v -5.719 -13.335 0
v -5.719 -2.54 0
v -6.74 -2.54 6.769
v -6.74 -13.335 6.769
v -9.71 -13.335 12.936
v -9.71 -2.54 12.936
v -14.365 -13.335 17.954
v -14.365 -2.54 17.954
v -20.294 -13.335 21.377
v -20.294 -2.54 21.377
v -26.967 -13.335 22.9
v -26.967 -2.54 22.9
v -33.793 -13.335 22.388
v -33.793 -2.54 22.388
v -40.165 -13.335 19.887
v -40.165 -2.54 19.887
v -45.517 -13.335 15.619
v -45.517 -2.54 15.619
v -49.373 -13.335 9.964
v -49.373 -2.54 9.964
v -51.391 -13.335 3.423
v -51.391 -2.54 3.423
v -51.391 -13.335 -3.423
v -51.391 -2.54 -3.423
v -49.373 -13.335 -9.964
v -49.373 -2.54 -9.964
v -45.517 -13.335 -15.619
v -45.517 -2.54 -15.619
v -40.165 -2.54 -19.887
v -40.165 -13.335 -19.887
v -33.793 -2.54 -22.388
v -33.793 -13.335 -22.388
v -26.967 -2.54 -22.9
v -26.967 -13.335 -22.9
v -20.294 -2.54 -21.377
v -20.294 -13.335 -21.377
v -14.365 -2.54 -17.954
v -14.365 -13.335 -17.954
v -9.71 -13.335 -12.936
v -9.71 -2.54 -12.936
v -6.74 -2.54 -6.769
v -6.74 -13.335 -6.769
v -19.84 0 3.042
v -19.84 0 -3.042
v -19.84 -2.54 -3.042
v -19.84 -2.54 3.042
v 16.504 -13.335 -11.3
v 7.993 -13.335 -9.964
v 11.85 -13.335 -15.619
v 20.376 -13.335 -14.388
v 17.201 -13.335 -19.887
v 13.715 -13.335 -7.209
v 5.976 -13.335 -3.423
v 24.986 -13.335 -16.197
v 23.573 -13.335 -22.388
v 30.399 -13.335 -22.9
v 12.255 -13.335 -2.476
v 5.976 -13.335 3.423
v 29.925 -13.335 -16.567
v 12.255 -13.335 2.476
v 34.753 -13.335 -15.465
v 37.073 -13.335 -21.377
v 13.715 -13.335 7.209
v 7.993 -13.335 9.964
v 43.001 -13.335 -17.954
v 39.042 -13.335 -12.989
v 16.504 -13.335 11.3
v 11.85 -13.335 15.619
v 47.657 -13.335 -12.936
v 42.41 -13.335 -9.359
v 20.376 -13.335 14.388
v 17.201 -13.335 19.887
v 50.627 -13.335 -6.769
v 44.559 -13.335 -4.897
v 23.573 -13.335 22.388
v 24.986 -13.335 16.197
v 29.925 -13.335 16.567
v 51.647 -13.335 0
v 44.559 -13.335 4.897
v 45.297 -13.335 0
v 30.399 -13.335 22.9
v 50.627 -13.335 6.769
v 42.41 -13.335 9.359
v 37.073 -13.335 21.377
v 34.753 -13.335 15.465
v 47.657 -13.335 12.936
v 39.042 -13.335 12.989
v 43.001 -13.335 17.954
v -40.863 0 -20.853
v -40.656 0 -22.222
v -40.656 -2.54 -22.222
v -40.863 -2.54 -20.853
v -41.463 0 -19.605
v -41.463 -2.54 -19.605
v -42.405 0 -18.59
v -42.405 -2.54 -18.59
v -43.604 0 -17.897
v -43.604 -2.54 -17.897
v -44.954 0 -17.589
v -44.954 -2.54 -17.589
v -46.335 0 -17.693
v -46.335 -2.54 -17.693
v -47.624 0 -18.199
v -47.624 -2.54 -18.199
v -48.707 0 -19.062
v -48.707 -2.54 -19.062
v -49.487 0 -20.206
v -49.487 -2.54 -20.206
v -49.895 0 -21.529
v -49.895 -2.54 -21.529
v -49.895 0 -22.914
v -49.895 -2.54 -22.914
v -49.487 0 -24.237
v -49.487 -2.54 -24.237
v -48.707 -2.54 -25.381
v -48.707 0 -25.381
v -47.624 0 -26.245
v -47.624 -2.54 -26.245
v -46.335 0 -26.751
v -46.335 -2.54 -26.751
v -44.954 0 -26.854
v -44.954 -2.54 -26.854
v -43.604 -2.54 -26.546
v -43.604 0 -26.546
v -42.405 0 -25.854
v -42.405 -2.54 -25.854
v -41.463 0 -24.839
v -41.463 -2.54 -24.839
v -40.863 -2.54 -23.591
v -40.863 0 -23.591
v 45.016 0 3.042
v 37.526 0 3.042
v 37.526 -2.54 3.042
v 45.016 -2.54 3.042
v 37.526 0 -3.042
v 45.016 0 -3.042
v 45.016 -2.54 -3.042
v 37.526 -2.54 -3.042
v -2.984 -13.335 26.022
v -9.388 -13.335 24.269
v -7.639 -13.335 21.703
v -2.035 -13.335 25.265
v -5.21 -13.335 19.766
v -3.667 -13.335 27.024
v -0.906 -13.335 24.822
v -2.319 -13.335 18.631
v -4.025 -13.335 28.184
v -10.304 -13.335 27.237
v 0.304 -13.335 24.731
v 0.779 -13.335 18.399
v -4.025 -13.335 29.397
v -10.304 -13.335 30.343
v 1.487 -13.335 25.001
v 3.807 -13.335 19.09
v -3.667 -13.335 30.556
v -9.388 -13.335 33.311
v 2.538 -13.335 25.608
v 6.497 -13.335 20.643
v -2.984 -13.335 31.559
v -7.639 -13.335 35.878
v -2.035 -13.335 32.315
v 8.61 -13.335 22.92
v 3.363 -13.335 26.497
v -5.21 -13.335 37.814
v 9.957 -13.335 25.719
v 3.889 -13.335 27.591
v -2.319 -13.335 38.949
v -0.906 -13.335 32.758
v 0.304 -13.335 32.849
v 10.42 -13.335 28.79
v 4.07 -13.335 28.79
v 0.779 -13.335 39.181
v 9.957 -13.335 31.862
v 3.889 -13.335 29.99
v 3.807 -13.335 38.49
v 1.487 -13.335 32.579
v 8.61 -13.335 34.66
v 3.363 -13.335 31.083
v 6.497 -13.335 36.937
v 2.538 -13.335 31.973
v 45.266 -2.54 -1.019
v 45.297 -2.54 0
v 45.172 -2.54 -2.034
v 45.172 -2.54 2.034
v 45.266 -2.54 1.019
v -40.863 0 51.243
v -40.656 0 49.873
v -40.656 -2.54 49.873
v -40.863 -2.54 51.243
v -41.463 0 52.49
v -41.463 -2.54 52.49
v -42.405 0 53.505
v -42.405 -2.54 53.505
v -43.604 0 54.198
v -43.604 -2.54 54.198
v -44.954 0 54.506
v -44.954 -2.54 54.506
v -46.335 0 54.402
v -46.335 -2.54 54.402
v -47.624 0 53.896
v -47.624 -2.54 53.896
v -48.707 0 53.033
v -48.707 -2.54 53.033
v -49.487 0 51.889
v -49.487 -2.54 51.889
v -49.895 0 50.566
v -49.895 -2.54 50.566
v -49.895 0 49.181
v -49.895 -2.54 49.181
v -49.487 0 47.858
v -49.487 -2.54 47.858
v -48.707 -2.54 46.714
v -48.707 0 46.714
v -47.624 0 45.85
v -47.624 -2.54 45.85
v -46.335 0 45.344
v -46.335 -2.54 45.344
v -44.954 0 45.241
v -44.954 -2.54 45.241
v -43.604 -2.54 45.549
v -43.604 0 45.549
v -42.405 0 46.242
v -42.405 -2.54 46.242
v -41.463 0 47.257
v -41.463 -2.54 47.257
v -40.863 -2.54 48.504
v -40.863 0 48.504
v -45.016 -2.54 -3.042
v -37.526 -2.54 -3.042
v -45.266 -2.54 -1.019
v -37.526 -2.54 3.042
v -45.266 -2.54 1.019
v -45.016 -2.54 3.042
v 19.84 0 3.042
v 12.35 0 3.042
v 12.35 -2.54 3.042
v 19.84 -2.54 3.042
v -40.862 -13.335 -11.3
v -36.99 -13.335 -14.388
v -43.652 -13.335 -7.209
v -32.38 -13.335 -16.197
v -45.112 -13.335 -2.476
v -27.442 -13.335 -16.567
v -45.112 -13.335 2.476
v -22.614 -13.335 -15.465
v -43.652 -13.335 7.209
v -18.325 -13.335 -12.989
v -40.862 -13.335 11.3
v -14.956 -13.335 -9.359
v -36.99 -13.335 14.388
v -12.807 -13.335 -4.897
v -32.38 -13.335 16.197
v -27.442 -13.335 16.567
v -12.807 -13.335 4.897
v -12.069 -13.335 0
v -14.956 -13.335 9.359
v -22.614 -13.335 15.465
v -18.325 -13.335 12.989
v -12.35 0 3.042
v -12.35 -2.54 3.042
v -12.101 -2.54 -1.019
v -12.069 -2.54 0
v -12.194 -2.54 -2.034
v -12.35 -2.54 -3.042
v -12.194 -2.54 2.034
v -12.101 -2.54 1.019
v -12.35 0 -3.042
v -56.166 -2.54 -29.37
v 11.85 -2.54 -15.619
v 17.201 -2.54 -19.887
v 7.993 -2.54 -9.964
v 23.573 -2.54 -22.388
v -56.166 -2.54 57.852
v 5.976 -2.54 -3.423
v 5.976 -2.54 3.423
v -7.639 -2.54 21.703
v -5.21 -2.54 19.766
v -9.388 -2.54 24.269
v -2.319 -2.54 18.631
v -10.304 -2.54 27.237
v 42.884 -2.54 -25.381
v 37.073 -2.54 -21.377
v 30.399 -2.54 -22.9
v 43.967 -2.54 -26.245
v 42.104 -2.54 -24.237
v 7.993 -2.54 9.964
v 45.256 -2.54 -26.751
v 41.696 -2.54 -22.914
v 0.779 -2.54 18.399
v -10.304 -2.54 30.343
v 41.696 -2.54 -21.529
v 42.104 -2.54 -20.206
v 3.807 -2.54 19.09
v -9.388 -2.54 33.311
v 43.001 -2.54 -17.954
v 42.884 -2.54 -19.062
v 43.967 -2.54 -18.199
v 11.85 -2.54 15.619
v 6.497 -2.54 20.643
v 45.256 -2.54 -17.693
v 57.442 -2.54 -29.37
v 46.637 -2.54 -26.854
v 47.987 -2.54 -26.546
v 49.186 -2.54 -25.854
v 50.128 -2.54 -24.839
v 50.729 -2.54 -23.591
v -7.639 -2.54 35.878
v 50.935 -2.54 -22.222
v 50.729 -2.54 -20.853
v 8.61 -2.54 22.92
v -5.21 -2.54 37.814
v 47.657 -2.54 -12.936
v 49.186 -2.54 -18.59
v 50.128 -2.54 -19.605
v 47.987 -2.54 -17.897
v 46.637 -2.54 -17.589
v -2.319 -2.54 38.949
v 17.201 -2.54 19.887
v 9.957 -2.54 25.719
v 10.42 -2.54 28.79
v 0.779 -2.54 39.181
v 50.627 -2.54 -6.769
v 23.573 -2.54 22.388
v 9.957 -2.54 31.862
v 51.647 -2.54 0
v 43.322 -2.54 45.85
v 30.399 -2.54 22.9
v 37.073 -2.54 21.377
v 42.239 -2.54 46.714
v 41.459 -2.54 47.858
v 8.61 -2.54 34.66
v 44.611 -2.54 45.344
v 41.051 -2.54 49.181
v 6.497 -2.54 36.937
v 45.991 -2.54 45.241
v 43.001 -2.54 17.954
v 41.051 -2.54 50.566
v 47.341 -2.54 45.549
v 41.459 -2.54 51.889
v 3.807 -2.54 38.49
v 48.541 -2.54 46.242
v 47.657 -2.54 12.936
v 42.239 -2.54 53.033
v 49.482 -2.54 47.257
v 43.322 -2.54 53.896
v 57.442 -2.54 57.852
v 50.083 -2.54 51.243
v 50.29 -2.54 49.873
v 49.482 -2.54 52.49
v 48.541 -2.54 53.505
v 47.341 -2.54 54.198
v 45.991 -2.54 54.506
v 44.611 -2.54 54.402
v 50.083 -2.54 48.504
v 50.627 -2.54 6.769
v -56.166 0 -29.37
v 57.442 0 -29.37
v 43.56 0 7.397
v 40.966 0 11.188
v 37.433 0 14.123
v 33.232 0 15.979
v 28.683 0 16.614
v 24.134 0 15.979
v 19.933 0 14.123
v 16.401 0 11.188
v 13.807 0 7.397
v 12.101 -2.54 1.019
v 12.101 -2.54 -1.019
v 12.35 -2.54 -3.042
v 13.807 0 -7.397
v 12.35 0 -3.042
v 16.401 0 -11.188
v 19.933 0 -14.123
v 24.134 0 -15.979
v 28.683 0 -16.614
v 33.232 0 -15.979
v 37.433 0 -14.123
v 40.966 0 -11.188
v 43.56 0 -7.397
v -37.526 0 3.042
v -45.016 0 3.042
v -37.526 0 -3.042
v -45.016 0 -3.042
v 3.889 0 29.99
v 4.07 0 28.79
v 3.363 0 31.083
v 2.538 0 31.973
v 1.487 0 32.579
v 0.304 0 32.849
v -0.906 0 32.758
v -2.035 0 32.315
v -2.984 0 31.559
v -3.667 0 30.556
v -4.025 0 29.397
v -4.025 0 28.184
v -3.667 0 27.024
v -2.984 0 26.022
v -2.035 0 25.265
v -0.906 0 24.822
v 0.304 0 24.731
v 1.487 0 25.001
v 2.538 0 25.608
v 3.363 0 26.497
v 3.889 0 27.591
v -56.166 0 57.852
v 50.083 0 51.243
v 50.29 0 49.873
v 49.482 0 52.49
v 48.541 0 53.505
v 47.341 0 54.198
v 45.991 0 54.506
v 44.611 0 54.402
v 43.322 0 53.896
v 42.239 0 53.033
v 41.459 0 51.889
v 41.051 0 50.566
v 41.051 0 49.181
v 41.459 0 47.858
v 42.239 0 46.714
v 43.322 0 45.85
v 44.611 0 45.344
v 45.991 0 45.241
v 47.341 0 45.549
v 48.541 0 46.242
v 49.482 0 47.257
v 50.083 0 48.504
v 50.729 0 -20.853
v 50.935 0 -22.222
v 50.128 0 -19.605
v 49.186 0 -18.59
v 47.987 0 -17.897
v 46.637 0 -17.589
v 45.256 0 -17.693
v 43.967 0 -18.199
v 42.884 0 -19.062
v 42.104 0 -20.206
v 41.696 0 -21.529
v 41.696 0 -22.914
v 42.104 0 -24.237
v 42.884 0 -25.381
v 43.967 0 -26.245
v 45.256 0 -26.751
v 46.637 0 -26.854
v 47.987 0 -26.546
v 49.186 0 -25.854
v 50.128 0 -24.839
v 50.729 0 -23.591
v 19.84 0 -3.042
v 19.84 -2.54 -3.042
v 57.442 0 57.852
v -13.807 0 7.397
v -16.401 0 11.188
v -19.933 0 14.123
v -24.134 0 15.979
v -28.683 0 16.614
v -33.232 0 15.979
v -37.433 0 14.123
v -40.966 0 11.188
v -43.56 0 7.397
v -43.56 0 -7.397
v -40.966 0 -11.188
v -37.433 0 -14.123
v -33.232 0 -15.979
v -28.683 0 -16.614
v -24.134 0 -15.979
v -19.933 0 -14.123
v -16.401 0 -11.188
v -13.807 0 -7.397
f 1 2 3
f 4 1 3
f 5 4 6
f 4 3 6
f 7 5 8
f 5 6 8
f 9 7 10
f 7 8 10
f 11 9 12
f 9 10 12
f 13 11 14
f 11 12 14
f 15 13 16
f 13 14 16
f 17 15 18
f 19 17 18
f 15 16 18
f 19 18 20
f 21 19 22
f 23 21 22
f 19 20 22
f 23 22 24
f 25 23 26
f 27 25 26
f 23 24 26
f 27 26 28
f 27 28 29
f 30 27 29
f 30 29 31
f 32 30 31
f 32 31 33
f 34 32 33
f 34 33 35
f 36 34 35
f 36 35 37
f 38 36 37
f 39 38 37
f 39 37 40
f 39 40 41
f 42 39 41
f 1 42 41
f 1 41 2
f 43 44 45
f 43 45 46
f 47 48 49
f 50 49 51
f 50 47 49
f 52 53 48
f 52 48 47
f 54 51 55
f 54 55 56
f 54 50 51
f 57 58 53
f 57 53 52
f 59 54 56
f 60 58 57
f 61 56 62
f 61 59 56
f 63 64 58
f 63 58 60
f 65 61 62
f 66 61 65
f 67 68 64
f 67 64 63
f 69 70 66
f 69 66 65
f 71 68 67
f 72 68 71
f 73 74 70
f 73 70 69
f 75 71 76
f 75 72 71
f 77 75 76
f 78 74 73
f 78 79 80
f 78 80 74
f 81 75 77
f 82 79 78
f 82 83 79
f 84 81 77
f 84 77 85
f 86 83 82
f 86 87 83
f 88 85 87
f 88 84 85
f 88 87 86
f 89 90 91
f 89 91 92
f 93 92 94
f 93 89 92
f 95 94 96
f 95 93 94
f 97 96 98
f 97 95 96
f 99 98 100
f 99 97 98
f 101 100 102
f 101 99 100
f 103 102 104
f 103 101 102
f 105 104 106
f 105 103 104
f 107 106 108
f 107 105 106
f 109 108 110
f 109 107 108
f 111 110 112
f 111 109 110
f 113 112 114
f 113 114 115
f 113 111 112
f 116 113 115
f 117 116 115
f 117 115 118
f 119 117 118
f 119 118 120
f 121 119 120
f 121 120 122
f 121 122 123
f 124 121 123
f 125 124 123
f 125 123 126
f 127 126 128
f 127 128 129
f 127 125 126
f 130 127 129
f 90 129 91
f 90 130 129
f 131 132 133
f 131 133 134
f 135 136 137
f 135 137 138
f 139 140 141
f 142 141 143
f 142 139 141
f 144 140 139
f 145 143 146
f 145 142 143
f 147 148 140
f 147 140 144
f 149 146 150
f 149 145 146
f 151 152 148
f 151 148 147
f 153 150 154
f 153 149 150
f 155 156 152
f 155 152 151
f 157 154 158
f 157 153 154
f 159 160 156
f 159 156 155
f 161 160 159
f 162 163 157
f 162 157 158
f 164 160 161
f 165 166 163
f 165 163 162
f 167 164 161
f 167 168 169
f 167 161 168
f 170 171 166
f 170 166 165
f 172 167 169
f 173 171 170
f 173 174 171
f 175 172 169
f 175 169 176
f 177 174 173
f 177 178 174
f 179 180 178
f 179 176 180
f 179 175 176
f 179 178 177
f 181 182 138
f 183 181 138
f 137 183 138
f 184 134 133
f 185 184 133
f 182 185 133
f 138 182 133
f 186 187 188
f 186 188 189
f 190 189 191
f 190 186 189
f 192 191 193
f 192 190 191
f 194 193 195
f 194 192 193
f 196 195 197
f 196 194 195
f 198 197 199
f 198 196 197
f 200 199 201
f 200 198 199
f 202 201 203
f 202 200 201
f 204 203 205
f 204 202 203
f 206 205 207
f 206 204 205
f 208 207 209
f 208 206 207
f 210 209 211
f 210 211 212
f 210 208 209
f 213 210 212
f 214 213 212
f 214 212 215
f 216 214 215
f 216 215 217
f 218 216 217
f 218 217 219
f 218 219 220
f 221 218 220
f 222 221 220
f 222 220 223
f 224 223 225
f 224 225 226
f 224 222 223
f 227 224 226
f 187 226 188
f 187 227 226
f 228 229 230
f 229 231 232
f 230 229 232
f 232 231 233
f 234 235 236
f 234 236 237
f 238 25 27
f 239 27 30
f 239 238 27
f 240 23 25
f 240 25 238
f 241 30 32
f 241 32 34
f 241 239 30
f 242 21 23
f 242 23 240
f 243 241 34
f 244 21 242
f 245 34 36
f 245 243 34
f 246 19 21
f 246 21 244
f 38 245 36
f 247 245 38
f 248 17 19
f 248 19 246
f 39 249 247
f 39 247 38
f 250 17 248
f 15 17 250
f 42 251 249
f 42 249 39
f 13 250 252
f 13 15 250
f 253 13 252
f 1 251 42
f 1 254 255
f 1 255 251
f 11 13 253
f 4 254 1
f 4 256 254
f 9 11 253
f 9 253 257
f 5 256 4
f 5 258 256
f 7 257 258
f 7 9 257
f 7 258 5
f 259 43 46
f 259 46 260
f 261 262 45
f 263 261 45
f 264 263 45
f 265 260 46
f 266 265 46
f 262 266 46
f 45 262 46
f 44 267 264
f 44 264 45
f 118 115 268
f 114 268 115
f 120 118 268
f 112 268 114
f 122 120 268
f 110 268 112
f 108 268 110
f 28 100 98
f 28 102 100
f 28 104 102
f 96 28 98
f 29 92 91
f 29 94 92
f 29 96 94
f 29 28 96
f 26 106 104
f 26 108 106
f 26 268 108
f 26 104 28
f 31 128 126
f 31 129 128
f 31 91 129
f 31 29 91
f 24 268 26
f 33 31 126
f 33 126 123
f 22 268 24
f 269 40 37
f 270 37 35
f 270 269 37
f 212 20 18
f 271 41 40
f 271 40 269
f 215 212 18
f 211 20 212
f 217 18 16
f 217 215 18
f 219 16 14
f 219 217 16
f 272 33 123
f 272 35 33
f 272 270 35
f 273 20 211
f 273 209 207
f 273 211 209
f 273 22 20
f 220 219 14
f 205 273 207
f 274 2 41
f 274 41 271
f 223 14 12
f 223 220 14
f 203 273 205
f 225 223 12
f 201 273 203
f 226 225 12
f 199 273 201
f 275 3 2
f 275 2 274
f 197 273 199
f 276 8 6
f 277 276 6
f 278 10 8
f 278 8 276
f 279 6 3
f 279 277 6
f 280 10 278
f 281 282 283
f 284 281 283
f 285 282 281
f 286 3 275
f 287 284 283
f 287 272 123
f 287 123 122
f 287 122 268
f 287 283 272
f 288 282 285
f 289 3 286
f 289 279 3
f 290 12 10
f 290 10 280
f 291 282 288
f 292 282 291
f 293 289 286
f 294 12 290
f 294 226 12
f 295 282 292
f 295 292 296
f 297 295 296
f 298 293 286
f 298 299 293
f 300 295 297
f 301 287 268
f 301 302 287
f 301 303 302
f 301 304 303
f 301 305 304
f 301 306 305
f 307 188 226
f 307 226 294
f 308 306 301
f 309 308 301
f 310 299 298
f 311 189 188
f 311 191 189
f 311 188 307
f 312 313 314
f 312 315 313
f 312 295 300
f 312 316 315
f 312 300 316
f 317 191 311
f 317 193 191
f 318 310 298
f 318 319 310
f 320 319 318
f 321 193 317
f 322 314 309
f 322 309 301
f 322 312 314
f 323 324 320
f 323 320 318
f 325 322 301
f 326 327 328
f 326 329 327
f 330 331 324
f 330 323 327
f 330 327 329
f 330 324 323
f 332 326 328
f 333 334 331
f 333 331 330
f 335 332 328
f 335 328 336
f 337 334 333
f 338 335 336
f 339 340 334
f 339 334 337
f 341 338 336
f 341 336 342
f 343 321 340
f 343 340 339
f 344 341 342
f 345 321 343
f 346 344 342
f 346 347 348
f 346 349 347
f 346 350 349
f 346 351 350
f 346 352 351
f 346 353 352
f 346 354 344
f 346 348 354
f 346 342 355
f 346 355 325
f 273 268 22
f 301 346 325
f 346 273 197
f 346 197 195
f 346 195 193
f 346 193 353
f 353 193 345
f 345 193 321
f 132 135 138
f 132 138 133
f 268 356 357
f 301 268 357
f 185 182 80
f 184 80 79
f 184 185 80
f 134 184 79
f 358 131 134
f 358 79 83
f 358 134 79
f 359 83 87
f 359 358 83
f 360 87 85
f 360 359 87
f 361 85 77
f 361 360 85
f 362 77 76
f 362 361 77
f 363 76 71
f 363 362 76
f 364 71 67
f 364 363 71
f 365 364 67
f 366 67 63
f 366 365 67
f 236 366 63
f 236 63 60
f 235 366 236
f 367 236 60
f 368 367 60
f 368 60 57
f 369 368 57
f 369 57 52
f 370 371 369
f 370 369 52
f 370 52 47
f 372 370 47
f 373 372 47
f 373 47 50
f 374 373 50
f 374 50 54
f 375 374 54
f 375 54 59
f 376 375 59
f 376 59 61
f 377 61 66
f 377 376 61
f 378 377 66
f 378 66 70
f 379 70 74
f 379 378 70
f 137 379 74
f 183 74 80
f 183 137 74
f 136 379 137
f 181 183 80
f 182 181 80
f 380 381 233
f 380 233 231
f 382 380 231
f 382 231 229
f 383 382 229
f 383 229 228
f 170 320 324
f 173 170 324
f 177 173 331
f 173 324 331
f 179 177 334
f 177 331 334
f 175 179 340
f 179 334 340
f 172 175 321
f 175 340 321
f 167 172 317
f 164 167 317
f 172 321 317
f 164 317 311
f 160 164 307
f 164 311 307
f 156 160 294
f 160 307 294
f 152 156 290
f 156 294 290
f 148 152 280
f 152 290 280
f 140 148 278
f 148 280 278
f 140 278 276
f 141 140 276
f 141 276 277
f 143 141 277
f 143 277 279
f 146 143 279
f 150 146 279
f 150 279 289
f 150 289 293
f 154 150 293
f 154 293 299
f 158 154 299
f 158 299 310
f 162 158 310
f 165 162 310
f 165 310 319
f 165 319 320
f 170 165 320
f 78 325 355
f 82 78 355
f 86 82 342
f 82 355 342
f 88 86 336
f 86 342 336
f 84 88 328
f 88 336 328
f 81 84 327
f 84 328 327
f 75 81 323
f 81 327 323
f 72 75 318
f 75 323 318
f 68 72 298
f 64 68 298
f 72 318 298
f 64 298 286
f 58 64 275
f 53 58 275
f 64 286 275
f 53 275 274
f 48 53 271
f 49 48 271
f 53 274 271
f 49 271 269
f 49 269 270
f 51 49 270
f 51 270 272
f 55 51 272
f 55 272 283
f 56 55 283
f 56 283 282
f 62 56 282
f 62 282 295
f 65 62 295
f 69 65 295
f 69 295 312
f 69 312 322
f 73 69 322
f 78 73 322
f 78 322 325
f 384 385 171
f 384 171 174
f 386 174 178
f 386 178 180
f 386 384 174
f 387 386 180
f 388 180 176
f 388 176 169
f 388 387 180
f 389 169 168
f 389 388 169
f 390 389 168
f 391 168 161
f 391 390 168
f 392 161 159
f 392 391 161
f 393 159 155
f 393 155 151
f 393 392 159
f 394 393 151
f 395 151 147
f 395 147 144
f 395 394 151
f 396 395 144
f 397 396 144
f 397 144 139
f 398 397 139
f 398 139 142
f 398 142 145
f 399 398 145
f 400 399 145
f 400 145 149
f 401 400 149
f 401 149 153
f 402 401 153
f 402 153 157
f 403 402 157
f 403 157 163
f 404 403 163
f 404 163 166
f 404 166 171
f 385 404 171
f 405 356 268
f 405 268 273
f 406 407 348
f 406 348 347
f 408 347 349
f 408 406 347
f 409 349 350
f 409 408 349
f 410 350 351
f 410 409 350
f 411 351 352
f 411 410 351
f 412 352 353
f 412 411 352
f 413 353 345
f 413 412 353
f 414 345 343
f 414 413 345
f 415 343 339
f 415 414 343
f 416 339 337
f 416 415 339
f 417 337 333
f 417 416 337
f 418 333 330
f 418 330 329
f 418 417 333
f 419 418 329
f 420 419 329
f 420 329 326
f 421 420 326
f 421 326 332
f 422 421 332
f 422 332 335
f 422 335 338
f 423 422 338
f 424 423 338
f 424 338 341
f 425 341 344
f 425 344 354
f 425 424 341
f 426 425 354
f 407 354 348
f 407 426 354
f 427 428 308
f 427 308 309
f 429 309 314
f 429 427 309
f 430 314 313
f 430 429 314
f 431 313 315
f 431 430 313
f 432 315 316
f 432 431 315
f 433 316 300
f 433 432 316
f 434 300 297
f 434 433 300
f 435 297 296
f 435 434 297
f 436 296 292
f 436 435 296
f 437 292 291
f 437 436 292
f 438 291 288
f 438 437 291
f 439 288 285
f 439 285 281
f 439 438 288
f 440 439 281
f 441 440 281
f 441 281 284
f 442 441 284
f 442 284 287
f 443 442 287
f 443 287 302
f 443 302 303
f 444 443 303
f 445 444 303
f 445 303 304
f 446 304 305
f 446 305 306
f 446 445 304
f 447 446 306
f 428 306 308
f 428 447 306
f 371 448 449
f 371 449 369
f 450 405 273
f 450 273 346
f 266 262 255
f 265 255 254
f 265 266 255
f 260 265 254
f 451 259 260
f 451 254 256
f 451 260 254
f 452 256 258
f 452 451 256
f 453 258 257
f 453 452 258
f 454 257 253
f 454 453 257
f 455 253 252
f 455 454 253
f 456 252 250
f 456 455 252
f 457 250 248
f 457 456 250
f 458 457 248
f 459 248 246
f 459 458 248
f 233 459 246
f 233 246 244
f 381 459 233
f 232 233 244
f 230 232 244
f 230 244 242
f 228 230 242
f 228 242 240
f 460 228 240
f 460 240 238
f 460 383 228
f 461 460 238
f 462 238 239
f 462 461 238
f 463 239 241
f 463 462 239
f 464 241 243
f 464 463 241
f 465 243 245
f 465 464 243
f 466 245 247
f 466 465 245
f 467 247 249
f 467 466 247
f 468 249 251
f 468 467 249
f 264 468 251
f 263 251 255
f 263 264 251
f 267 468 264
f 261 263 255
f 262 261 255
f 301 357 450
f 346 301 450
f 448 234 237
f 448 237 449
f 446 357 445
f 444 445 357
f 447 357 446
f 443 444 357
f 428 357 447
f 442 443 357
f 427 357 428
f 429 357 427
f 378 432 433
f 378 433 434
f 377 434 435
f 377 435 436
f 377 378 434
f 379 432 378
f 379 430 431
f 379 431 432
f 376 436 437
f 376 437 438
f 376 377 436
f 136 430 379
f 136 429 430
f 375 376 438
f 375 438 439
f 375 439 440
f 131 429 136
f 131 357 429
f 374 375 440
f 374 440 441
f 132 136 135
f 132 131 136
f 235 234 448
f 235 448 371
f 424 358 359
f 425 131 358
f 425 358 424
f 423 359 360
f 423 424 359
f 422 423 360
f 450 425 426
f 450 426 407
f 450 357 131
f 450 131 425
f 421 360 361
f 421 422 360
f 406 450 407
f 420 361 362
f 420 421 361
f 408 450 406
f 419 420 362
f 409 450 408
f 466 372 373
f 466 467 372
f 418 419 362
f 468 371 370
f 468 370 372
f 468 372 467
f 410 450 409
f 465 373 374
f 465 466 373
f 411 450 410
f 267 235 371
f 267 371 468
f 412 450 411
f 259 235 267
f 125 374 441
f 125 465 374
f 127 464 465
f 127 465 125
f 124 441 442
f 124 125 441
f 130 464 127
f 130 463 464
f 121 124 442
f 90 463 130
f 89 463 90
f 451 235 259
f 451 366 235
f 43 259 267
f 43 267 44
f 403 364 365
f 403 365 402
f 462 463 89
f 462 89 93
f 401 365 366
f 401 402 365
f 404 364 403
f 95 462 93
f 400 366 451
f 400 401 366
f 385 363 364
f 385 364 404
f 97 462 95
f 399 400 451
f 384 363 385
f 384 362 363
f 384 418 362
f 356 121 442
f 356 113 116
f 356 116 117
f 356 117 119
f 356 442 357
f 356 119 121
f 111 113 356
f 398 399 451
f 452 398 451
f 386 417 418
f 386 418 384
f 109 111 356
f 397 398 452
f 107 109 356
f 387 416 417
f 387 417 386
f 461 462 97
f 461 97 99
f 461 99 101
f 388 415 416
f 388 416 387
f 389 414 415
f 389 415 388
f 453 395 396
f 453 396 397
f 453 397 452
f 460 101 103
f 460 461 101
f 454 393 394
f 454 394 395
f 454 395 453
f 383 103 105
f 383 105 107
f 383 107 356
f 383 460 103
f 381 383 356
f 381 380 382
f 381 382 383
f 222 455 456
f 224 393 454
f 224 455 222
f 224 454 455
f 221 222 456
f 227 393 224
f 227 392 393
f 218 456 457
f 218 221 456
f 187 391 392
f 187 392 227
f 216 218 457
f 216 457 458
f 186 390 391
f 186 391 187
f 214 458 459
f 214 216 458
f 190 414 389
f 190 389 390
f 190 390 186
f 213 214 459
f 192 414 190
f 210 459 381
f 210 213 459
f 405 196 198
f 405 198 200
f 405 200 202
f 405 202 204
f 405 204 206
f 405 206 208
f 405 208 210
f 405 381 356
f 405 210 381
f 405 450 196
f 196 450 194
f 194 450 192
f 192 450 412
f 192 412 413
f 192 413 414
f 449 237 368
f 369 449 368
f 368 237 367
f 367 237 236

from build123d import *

# Parameters (mm, degrees)
F2_W     = 113.607649
F2_H     = 87.222615
F2_R     = 4.645393
F2_R_2   = 22.963932
F2_R_3   = 10.420251
F2_R_4   = 16.613932
F2_R_5   = 4.070252
F3_DEPTH = 2.54
F4_DEPTH = 13.335
F6_DEPTH = 2.54


with BuildPart() as f3:
    # F2 (on Front) → F3 (new body)
    with BuildSketch(Plane.XZ):
        with Locations((0.638156, 14.24115)):
            Rectangle(F2_W, F2_H)
        with Locations((-45.301553, -22.221763)):
            Circle(F2_R, mode=Mode.SUBTRACT)
        with Locations((-28.683275, 0)):
            Circle(F2_R_2, mode=Mode.SUBTRACT)
        with Locations((46.289496, -22.221763)):
            Circle(F2_R, mode=Mode.SUBTRACT)
        with Locations((28.683275, 0)):
            Circle(F2_R_2, mode=Mode.SUBTRACT)
        with Locations((0, 28.790265)):
            Circle(F2_R_3, mode=Mode.SUBTRACT)
        with Locations((-45.301553, 49.873423)):
            Circle(F2_R, mode=Mode.SUBTRACT)
        with Locations((45.644229, 49.873423)):
            Circle(F2_R, mode=Mode.SUBTRACT)
        with Locations((-28.683275, 0)):
            Circle(F2_R_2)
        with Locations((-28.683275, 0)):
            Circle(F2_R_4, mode=Mode.SUBTRACT)
        with Locations((0, 28.790265)):
            Circle(F2_R_3)
        with Locations((0, 28.790265)):
            Circle(F2_R_5, mode=Mode.SUBTRACT)
        with Locations((28.683275, 0)):
            Circle(F2_R_2)
        with Locations((28.683275, 0)):
            Circle(F2_R_4, mode=Mode.SUBTRACT)
    extrude(amount=F3_DEPTH)

    # F2 (on Front) → F4 (join)
    with BuildSketch(Plane.XZ):
        with Locations((0, 28.790265)):
            Circle(F2_R_3)
        with Locations((0, 28.790265)):
            Circle(F2_R_5, mode=Mode.SUBTRACT)
        with Locations((28.683275, 0)):
            Circle(F2_R_2)
        with Locations((28.683275, 0)):
            Circle(F2_R_4, mode=Mode.SUBTRACT)
        with Locations((-28.683275, 0)):
            Circle(F2_R_2)
        with Locations((-28.683275, 0)):
            Circle(F2_R_4, mode=Mode.SUBTRACT)
    extrude(amount=F4_DEPTH)

    # F5 (on face) → F6 (join)
    with BuildSketch(Plane(origin=(0, 0, 0), x_dir=(-1, 0, 0), z_dir=(0, 1, 0))):
        with BuildLine():
            Line((-12.350136, 3.041595), (-19.840281, 3.041595))
            Line((-19.840281, 3.041595), (-19.840281, -3.041595))
            Line((-19.840281, -3.041595), (-12.350136, -3.041595))
            ThreePointArc((-12.350136, -3.041595), (-12.069343, 0), (-12.350136, 3.041595))
        make_face()
        with BuildLine():
            Line((-37.526269, -3.041595), (-37.526269, 3.041595))
            Line((-37.526269, 3.041595), (-45.016414, 3.041595))
            ThreePointArc((-45.016414, 3.041595), (-45.297207, 0), (-45.016414, -3.041595))
            Line((-45.016414, -3.041595), (-37.526269, -3.041595))
        make_face()
        with BuildLine():
            Line((45.016414, 3.041595), (37.526269, 3.041595))
            Line((37.526269, 3.041595), (37.526269, -3.041595))
            Line((37.526269, -3.041595), (45.016414, -3.041595))
            ThreePointArc((45.016414, -3.041595), (45.297207, 0), (45.016414, 3.041595))
        make_face()
        with BuildLine():
            ThreePointArc((12.350136, 3.041595), (12.069343, 0), (12.350136, -3.041595))
            Line((12.350136, -3.041595), (19.840281, -3.041595))
            Line((19.840281, -3.041595), (19.840281, 3.041595))
            Line((19.840281, 3.041595), (12.350136, 3.041595))
        make_face()
    extrude(amount=-F6_DEPTH)


solid = f3.part
